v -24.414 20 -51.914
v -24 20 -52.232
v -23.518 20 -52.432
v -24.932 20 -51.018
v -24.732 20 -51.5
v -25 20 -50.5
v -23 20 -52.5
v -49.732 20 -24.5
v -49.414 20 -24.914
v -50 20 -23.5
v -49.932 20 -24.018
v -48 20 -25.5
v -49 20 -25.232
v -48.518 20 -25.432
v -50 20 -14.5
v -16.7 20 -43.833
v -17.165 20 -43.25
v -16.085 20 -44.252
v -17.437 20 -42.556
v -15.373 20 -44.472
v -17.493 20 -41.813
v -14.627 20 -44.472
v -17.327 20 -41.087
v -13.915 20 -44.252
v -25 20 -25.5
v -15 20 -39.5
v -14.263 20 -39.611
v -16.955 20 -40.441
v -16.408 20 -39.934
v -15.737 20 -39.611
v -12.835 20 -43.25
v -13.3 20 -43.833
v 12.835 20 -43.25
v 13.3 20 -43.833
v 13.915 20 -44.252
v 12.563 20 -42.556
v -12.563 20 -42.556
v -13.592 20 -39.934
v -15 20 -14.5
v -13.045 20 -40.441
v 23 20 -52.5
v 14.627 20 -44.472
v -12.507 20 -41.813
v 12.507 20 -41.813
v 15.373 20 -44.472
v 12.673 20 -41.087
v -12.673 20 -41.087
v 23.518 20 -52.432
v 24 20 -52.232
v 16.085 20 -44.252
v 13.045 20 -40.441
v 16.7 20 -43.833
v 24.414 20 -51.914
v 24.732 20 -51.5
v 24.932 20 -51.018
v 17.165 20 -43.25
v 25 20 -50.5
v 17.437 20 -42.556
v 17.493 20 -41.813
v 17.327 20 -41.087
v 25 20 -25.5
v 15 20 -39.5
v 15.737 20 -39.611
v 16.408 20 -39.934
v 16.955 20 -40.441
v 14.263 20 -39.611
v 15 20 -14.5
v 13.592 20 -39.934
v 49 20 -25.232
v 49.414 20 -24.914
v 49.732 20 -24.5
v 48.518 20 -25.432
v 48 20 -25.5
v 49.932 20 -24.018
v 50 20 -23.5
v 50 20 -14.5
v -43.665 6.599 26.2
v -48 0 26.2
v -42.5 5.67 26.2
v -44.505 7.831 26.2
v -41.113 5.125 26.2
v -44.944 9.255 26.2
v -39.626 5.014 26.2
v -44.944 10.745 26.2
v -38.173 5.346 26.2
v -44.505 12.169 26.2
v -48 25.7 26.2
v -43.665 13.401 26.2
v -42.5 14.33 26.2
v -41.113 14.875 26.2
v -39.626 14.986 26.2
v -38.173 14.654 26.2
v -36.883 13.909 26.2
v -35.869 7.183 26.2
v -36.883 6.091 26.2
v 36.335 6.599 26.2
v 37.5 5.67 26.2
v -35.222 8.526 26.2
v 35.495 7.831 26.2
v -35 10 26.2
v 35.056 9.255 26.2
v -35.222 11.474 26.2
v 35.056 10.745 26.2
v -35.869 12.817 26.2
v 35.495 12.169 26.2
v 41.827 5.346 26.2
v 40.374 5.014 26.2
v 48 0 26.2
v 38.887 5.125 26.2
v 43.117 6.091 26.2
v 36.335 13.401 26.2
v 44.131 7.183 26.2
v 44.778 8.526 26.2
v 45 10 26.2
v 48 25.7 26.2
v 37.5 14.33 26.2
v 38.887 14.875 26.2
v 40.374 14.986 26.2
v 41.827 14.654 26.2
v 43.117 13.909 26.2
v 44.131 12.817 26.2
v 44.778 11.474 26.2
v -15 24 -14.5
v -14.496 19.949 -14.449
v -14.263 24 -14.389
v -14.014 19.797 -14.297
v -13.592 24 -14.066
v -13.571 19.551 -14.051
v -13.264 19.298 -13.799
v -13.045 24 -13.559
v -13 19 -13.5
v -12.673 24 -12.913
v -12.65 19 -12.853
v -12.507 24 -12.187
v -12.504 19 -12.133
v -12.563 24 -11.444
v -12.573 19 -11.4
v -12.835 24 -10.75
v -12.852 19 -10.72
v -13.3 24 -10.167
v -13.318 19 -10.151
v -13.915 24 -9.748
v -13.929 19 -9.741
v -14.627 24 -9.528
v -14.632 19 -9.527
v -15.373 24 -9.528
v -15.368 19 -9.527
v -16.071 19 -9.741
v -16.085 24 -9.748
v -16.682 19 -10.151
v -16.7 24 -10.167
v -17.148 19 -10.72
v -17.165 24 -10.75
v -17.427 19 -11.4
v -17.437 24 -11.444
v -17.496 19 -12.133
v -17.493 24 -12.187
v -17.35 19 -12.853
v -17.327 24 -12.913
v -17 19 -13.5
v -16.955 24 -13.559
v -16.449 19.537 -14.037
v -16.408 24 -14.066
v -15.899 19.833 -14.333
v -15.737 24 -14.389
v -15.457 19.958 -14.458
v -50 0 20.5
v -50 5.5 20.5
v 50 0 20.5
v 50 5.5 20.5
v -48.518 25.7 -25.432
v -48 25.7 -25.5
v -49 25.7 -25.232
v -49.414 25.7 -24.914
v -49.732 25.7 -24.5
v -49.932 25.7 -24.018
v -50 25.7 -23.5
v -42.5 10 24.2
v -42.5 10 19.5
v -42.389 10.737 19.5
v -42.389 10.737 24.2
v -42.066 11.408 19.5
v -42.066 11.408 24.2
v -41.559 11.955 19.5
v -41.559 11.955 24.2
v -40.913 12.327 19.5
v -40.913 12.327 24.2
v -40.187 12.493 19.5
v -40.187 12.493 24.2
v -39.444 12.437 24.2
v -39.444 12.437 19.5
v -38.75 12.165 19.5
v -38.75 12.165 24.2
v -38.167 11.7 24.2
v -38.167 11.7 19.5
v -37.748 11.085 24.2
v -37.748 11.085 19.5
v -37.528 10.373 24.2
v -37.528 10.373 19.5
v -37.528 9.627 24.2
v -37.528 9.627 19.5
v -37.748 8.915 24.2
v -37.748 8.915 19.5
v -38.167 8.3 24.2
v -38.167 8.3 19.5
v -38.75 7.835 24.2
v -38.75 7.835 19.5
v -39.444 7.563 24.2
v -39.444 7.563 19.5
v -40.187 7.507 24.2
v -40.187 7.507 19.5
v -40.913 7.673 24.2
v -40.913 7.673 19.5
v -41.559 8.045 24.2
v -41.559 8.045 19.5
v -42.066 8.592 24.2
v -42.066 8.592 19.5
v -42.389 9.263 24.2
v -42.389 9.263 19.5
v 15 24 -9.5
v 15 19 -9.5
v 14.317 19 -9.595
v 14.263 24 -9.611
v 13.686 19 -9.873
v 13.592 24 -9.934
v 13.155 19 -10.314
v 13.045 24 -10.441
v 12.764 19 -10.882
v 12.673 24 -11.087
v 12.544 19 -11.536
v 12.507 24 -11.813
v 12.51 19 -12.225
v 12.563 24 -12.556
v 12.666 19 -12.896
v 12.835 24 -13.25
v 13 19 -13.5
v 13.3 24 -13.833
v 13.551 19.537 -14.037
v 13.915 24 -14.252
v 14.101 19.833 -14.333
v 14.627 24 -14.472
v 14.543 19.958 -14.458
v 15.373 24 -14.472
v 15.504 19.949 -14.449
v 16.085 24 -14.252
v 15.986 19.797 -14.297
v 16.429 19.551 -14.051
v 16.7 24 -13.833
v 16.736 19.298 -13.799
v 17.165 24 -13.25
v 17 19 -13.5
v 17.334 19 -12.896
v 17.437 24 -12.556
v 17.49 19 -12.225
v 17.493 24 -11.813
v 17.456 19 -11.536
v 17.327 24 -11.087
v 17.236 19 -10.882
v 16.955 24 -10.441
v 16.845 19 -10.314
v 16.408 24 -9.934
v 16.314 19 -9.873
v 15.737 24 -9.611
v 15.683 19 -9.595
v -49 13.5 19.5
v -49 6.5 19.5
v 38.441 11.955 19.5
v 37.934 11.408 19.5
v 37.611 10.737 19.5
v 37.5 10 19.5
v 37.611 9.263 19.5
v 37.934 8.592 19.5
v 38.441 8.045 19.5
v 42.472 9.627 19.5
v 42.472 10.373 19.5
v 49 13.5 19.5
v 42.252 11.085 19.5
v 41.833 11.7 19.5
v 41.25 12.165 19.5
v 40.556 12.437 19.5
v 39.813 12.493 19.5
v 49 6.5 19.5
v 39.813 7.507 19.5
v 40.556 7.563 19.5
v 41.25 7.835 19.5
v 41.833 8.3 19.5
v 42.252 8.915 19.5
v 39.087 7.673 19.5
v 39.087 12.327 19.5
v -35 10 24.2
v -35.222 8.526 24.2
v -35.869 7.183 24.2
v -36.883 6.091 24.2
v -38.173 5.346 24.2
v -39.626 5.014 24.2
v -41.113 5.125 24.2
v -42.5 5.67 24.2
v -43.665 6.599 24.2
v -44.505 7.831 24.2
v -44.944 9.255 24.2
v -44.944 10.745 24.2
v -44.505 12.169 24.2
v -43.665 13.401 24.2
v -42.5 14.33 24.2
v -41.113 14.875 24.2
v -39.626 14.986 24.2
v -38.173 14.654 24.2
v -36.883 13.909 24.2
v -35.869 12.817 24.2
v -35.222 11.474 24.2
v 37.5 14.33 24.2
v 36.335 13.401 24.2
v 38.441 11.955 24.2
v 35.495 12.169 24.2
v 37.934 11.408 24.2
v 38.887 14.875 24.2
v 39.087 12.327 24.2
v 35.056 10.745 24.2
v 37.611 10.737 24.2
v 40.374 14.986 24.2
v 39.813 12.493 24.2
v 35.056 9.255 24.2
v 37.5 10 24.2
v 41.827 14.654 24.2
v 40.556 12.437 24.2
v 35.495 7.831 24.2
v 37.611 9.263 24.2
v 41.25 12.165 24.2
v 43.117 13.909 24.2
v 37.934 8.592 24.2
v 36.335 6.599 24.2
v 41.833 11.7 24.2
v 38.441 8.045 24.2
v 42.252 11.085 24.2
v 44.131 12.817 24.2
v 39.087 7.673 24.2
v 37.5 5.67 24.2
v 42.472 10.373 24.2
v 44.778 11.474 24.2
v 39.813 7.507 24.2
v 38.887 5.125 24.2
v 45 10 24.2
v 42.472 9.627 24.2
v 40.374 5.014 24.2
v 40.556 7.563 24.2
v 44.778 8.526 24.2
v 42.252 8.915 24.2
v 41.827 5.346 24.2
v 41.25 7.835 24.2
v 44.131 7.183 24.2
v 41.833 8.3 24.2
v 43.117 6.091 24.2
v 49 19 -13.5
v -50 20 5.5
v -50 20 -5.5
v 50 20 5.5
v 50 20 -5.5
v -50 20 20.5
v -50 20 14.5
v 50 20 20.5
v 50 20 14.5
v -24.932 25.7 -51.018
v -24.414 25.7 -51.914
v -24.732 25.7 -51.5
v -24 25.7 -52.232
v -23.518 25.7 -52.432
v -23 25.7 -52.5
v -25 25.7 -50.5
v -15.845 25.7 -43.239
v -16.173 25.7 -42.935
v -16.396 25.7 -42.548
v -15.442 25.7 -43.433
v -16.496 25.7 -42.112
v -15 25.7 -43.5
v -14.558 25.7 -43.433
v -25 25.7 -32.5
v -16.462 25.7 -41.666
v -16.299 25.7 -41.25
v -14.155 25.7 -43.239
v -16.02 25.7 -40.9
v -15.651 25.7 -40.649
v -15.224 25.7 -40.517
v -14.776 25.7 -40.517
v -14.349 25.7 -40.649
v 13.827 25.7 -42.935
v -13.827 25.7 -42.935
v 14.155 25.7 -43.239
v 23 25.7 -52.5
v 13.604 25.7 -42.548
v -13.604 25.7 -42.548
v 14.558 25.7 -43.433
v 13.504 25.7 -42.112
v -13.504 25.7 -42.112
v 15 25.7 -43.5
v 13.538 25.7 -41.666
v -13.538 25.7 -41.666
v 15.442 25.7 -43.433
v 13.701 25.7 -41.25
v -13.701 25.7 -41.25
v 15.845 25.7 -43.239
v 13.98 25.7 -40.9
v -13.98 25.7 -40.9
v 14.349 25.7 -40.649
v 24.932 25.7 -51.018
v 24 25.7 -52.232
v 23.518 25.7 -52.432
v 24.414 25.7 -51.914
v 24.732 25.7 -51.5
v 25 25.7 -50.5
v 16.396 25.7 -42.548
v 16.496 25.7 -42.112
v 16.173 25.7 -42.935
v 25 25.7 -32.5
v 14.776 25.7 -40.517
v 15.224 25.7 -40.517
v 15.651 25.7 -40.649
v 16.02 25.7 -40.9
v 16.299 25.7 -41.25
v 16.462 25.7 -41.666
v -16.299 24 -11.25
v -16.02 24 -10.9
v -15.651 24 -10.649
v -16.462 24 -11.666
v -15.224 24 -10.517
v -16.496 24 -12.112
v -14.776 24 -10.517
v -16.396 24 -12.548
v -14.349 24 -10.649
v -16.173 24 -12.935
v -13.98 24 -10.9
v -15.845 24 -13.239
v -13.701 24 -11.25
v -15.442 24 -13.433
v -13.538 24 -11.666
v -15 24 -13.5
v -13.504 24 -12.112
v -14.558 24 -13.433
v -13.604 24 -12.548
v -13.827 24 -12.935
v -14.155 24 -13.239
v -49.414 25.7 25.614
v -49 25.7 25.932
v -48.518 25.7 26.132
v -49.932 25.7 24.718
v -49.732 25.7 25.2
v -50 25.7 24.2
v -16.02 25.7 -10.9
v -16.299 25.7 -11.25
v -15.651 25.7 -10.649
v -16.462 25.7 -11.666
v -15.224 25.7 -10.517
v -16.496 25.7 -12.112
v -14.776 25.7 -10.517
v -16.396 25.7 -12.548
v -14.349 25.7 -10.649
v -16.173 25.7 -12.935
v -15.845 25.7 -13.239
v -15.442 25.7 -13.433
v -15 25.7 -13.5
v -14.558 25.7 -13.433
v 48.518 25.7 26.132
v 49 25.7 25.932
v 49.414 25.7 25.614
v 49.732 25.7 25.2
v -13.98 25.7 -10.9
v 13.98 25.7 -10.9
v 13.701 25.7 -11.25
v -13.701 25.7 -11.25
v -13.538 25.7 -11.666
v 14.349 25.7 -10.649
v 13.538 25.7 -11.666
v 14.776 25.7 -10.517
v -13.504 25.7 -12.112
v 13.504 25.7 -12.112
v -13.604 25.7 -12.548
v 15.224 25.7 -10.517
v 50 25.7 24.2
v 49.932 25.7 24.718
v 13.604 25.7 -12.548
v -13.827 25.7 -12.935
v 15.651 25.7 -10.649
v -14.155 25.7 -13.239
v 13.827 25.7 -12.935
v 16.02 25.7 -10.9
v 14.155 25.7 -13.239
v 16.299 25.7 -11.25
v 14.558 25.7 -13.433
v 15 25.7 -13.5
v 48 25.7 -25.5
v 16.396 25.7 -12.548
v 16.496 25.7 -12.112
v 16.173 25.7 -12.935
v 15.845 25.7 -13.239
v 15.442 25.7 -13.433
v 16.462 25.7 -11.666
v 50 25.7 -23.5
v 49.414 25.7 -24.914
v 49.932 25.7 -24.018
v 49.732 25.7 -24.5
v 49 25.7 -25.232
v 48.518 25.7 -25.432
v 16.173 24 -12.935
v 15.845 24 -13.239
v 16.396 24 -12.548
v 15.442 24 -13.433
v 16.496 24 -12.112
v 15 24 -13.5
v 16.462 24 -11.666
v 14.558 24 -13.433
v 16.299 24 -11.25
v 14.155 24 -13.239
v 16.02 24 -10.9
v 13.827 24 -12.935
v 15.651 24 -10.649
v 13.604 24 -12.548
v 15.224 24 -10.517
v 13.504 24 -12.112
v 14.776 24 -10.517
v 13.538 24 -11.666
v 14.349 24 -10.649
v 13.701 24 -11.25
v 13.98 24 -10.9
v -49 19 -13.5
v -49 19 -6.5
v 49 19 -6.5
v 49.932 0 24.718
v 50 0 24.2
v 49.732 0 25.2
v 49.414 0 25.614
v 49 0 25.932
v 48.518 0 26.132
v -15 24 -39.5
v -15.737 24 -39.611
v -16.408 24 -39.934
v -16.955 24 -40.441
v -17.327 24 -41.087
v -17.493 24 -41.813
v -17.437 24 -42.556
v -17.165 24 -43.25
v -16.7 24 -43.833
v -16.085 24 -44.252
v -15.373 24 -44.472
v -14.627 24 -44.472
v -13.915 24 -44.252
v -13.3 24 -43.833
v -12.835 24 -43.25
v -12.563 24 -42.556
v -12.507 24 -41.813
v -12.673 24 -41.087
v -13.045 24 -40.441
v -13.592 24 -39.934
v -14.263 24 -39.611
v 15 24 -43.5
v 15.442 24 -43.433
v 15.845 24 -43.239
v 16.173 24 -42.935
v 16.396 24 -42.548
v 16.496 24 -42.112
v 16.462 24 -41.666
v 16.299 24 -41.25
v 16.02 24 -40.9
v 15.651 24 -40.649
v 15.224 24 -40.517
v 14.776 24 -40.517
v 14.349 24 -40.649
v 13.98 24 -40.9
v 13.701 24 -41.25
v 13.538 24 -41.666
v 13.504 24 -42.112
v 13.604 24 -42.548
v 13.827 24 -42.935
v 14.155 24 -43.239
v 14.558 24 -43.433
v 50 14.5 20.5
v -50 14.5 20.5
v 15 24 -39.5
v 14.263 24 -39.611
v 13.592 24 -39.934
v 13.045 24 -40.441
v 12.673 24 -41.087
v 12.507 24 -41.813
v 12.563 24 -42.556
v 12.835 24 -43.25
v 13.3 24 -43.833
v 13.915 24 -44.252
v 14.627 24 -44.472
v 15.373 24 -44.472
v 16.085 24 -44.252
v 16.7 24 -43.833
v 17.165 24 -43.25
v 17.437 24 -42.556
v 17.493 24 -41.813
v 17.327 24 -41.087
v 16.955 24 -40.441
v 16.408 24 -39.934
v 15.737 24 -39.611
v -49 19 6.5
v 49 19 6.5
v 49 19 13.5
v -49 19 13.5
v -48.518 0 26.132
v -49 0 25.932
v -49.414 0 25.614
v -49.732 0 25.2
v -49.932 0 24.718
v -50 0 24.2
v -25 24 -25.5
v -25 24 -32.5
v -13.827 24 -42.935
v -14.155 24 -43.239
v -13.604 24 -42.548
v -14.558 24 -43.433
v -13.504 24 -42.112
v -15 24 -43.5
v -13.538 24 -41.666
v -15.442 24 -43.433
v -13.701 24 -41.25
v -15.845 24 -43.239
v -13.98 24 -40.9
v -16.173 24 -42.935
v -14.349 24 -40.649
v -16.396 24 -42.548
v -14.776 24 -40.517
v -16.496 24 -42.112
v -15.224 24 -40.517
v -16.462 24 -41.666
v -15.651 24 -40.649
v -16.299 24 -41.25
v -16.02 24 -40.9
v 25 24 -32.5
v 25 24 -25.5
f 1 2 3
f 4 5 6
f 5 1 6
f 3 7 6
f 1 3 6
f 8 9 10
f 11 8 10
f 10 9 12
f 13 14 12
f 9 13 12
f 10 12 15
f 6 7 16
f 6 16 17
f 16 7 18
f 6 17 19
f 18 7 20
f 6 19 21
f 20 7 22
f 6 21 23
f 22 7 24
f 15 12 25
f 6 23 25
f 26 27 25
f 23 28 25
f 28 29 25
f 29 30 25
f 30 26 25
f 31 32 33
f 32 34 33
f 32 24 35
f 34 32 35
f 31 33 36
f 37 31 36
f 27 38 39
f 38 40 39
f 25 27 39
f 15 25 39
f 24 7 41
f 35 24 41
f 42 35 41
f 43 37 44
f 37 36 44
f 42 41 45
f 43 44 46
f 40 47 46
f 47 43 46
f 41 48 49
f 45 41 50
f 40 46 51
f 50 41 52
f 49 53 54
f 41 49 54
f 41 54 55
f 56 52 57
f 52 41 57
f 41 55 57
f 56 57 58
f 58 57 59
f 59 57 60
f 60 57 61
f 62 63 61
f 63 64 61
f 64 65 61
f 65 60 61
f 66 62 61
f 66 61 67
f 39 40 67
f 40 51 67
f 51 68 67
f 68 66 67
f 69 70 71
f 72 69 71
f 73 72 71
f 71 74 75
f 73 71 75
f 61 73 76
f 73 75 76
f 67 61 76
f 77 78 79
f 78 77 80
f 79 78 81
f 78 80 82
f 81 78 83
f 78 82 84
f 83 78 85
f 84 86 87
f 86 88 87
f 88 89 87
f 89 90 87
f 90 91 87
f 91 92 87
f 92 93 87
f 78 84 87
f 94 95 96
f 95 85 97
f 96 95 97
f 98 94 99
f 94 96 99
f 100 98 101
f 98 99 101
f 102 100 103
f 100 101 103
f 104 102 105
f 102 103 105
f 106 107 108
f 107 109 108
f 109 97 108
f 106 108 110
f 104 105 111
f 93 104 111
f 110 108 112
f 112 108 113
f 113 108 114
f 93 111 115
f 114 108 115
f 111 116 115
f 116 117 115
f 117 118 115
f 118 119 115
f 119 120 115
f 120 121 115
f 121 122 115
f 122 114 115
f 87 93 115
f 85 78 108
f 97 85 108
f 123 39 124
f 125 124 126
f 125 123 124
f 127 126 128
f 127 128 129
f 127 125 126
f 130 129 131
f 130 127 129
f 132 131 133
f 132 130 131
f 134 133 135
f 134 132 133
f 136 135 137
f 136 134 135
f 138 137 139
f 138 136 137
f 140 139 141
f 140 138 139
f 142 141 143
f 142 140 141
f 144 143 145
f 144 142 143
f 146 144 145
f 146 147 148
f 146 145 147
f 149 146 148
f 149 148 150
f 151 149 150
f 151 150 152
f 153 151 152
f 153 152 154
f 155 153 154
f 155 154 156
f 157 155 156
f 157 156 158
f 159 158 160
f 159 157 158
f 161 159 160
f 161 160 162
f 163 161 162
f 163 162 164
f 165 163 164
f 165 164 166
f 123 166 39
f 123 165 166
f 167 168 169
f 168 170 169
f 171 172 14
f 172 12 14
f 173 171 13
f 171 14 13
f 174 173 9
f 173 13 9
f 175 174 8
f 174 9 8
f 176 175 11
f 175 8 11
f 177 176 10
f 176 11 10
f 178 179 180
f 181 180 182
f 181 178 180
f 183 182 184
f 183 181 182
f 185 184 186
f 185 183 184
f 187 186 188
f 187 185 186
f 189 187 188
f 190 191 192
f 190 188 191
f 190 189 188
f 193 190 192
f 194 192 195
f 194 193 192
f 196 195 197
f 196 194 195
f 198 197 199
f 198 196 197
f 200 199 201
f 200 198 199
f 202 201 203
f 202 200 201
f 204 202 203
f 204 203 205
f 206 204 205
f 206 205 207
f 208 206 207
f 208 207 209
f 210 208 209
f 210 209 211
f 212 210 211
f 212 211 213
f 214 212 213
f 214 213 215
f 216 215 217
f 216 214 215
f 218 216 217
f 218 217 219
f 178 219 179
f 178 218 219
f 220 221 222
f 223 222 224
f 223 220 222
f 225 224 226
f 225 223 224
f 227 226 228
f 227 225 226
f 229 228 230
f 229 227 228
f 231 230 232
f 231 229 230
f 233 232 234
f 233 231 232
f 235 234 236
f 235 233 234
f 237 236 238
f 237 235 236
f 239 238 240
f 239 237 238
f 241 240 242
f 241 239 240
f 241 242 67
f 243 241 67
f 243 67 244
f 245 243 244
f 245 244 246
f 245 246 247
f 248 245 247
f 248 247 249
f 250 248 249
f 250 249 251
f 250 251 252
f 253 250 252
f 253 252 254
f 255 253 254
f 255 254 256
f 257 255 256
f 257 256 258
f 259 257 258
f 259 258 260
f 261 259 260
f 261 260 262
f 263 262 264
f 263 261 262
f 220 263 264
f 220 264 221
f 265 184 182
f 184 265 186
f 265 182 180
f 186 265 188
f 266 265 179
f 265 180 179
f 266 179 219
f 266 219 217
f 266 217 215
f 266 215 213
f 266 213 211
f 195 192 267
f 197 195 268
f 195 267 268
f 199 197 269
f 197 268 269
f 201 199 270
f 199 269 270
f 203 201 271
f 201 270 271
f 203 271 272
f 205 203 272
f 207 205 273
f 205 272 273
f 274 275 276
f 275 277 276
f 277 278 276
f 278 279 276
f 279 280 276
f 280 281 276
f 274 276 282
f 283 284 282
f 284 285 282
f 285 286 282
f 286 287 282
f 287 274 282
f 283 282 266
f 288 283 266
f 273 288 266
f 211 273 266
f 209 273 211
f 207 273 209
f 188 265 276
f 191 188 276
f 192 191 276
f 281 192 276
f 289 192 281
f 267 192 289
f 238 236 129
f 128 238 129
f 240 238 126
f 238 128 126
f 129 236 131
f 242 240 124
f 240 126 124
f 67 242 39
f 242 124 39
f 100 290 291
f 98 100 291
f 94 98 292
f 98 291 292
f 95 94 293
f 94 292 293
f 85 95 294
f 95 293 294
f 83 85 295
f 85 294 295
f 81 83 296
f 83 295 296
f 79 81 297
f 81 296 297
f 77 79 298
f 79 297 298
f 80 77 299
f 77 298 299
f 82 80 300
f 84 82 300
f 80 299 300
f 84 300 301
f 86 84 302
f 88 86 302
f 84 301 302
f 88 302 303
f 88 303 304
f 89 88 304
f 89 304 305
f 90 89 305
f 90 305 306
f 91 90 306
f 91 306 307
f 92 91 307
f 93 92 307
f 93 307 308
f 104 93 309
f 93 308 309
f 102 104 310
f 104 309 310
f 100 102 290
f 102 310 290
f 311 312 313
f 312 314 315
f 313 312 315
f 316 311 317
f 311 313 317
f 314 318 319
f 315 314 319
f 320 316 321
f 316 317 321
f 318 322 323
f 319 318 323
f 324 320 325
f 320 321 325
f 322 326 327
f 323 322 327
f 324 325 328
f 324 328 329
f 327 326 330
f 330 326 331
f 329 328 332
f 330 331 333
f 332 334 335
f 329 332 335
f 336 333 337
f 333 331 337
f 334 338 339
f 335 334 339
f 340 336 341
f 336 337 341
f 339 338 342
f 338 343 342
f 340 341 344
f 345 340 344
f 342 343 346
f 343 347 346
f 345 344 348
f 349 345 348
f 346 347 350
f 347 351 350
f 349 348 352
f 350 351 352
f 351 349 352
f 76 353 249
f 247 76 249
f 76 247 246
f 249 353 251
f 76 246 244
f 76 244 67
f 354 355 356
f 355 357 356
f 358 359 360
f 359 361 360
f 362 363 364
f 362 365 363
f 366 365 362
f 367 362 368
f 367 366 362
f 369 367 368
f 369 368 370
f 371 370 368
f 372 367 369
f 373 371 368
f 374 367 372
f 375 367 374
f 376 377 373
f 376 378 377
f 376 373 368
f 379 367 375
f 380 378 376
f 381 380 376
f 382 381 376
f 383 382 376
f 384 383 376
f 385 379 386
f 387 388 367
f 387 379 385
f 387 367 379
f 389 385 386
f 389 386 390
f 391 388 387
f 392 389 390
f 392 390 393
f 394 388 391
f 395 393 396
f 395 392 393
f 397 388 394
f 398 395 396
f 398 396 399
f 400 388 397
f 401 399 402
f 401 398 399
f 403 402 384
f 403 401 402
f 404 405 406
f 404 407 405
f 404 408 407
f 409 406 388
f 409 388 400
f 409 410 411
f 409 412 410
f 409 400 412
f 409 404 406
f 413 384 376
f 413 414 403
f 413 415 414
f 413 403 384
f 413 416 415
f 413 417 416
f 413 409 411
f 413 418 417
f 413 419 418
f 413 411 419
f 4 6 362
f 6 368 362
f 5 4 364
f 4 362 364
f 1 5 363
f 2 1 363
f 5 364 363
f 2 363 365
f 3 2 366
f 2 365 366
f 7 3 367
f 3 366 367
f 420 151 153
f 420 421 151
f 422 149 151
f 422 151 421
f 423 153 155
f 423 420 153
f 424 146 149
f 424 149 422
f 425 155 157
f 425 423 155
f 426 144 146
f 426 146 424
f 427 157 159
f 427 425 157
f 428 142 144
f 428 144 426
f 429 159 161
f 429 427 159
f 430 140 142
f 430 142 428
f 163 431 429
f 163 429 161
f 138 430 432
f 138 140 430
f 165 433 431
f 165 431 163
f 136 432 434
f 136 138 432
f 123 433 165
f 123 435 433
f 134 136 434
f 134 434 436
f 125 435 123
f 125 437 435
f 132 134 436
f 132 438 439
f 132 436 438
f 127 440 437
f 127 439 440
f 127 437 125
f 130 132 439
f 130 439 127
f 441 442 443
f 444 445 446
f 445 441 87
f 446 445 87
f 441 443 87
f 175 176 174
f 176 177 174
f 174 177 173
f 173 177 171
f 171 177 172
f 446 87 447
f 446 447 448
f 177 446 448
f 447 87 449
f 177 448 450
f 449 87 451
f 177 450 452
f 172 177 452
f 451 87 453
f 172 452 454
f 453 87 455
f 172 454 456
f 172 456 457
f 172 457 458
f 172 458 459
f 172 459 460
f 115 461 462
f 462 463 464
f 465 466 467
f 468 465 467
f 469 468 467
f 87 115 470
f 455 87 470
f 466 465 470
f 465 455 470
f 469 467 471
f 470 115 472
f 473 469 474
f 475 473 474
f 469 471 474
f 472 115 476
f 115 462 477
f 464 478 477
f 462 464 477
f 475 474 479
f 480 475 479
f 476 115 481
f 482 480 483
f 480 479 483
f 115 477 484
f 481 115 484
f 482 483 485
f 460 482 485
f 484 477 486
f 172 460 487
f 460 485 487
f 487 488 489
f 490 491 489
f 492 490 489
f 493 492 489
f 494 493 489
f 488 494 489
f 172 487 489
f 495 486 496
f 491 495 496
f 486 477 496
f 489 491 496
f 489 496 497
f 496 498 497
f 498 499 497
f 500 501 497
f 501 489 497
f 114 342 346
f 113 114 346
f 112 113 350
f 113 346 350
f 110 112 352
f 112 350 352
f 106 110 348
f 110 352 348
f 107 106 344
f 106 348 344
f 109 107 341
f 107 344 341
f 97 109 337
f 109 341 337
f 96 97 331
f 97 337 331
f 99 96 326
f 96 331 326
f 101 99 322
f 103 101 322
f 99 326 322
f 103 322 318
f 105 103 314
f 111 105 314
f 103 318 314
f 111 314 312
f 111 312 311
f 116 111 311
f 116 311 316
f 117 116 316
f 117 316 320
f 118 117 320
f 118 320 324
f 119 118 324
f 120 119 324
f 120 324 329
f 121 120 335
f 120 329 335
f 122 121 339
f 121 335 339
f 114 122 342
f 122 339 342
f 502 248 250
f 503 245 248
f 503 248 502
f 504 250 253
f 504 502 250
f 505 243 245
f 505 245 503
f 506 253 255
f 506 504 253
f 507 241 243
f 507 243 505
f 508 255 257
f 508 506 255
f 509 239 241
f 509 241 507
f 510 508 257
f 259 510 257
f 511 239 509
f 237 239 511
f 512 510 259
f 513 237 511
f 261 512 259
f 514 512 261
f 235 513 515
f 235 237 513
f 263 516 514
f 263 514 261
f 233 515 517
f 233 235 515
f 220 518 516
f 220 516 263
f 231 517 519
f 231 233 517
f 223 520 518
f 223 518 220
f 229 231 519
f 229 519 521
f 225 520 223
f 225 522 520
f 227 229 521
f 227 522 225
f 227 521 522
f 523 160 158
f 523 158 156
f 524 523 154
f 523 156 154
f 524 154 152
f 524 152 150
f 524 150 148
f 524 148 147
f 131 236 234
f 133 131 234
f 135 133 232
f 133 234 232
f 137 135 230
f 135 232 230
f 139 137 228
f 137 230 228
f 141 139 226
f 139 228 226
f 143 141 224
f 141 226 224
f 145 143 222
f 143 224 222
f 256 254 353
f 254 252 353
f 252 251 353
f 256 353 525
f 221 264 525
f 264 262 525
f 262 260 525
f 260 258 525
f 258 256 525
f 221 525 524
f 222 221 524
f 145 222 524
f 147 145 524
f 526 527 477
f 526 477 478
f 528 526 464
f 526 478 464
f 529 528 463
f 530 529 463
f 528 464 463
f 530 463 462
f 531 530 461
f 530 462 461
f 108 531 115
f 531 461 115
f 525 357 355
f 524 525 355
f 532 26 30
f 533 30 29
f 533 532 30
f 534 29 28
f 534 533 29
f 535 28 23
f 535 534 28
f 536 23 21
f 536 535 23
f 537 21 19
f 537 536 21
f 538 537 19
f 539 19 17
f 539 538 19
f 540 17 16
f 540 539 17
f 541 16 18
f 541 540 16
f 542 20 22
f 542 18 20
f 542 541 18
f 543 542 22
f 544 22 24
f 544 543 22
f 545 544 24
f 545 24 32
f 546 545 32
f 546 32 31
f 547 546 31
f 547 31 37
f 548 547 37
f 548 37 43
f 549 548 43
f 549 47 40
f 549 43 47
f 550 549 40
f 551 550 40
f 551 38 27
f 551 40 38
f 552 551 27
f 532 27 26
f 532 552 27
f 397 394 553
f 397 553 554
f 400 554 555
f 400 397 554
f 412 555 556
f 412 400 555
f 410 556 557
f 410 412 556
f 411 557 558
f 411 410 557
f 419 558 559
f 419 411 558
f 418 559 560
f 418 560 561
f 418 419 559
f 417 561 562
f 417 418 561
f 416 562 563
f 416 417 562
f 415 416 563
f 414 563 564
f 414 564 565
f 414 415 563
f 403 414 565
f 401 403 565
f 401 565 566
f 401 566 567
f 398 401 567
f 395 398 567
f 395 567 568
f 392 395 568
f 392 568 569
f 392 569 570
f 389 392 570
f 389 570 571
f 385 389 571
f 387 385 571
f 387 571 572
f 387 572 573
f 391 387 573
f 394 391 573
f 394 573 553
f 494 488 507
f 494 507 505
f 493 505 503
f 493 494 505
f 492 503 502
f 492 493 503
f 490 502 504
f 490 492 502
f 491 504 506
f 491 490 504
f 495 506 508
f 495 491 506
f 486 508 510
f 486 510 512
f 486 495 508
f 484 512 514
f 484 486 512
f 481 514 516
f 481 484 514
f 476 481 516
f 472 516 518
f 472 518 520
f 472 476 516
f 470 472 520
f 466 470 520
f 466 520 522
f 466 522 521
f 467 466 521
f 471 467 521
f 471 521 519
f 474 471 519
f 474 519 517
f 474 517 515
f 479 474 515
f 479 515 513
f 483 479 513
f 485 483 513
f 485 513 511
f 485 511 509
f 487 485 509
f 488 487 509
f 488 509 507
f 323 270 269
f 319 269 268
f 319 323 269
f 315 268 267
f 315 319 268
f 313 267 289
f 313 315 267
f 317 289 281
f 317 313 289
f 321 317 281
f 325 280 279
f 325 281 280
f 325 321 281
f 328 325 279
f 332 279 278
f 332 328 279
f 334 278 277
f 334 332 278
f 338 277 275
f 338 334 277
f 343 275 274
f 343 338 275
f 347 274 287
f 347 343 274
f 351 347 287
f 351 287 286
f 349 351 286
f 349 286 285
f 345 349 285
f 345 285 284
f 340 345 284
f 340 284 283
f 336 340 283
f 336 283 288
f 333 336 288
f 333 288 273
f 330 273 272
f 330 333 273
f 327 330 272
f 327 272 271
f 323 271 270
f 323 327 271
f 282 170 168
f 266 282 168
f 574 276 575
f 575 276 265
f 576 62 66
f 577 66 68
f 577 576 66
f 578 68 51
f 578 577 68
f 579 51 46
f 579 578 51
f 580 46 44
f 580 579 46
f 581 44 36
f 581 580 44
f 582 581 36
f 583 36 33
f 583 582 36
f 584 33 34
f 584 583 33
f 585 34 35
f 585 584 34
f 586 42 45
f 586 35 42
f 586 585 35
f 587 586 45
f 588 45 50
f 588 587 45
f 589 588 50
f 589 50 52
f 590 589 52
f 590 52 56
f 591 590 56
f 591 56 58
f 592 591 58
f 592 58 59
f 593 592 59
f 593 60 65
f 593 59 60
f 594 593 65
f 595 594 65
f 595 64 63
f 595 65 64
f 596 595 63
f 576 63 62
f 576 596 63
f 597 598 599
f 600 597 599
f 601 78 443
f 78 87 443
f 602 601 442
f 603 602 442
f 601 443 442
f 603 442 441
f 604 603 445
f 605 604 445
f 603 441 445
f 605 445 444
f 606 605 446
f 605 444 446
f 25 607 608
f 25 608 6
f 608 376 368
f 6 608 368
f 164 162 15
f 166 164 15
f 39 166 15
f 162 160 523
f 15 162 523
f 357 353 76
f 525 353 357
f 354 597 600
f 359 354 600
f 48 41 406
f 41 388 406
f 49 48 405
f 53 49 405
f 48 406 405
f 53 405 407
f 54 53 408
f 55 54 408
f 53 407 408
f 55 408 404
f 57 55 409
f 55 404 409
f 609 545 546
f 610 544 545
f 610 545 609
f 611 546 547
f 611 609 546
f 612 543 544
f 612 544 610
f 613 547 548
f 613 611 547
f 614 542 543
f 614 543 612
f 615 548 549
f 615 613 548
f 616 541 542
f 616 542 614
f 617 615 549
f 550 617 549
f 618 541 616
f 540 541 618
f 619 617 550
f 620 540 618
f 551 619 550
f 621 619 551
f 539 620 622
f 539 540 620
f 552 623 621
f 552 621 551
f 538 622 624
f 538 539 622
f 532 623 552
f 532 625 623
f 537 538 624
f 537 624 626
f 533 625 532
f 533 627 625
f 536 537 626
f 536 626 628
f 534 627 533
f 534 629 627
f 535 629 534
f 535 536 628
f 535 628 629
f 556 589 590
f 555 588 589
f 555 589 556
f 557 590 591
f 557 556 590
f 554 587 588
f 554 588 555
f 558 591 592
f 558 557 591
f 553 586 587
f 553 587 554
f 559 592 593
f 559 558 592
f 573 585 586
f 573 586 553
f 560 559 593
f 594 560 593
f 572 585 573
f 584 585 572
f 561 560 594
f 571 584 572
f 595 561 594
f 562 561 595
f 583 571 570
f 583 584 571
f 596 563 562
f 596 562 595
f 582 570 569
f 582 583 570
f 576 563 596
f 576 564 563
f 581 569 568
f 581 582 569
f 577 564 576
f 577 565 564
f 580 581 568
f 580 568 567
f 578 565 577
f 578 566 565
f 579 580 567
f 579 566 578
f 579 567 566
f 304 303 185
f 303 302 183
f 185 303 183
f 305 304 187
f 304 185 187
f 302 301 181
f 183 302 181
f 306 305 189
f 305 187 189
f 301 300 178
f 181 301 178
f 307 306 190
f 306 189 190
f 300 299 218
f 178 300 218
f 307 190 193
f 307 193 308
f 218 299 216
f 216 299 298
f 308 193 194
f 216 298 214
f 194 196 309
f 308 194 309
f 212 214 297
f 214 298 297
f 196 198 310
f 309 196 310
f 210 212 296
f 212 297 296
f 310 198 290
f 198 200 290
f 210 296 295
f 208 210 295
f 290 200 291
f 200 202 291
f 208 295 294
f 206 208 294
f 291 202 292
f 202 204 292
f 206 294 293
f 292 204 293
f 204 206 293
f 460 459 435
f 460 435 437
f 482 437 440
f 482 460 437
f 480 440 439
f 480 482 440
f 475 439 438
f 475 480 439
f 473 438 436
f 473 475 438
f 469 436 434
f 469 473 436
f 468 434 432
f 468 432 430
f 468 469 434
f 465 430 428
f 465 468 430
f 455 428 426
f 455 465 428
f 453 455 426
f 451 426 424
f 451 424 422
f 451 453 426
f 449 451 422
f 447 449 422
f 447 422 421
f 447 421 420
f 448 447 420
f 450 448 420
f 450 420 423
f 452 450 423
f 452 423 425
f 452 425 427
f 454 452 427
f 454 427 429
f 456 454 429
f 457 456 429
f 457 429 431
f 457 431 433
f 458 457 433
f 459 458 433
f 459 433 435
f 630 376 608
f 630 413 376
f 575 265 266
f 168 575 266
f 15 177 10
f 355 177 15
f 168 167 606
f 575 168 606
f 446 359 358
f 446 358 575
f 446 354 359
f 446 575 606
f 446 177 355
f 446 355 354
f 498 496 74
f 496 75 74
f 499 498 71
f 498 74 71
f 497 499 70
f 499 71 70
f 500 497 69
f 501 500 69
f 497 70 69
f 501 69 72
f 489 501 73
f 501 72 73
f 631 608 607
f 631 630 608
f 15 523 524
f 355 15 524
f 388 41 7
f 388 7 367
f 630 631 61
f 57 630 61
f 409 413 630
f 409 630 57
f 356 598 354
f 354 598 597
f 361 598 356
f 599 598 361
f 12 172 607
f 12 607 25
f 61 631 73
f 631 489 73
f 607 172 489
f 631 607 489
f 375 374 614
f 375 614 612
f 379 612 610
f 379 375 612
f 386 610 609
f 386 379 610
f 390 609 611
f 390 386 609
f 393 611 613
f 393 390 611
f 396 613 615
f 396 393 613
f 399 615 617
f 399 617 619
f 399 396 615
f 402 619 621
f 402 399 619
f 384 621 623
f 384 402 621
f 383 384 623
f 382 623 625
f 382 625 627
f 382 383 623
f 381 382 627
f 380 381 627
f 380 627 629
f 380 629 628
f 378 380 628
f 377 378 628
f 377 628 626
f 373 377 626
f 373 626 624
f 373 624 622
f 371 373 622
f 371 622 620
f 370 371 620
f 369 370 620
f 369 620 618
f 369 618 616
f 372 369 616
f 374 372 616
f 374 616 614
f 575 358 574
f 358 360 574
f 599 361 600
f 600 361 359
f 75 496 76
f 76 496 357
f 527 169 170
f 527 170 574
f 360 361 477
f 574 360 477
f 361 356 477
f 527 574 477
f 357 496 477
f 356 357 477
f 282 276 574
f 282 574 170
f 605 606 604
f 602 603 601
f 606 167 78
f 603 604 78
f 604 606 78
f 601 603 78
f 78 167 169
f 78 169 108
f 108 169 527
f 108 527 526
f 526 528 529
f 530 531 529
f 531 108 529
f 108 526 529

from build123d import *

# Parameters (mm, degrees)
BOSS_EXTRUDE1_DEPTH     = 50
BOSS_EXTRUDE2_DEPTH     = 25
CHAMFER1_SIZE           = 1
CUT_EXTRUDE1_DEPTH      = 76.208044782
CUT_EXTRUDE1_DEPTH_BACK = 76.208044782
SKETCH2_R               = 1.5
CUT_EXTRUDE2_DEPTH      = 76.208044782
CUT_EXTRUDE2_DEPTH_BACK = 4
SKETCH2_3_R             = 2.5
SKETCH2_3_R_2           = 1.5
CUT_EXTRUDE3_DEPTH      = 92.348180058
CUT_EXTRUDE3_DEPTH_BACK = 92.348180058
SKETCH3_R               = 2.5
CUT_EXTRUDE4_START      = -4.7
SKETCH3_3_R             = 5
SKETCH3_3_R_2           = 2.5
CUT_EXTRUDE4_DEPTH      = 2
FILLET1_R               = 2


with BuildPart() as part:
    # Sketch1 → Boss-Extrude1 (new, symmetric)
    with BuildSketch(Plane(origin=(0, 0, 0), x_dir=(0, 0, -1), z_dir=(1, 0, 0))):
        Polygon((25.5, 25.7), (25.5, 20), (14.5, 20), (14.5, 19), (5.5, 19), (5.5, 20), (-5.5, 20), (-5.5, 19), (-14.5, 19), (-14.5, 20), (-20.5, 20), (-20.5, 14.5), (-19.5, 14.5), (-19.5, 5.5), (-20.5, 5.5), (-20.5, 0), (-26.2, 0), (-26.2, 25.7), align=None)
    extrude(amount=BOSS_EXTRUDE1_DEPTH, both=True)

    # Sketch1<3> → Boss-Extrude2 (add, symmetric)
    with BuildSketch(Plane(origin=(0, 0, 0), x_dir=(0, 0, -1), z_dir=(1, 0, 0))):
        Polygon((32.5, 24), (25.5, 24), (25.5, 20), (52.5, 20), (52.5, 25.7), (32.5, 25.7), align=None)
    extrude(amount=BOSS_EXTRUDE2_DEPTH, both=True)

    # Chamfer1
    chamfer1_edges = [part.edges().sort_by_distance(p)[0] for p in [
        (0, 5.5, 19.5),
        (0, 14.5, 19.5),
        (0, 19, 14.5),
        (0, 19, 5.5),
        (0, 19, -5.5),
        (0, 19, -14.5),
        (-50, 10, 19.5),
        (50, 10, 19.5),
        (50, 19, 10),
        (-50, 19, 10),
        (50, 19, -10),
        (-50, 19, -10),
    ]]
    chamfer(chamfer1_edges, length=CHAMFER1_SIZE - 0.0001)  # a hair under: the kernel refuses the full size

    # Sketch2 → Cut-Extrude1 (cut, two sides: drawn at the far end of the back side and taken through both)
    with BuildSketch(Plane.XZ.offset(-20).offset(-CUT_EXTRUDE1_DEPTH_BACK)):
        with Locations(Location((-15, -42, 0), (0, 0, 270))):
            Circle(SKETCH2_R)
        with Locations(Location((15, -42, 0), (0, 0, 270))):
            Circle(SKETCH2_R)
        with Locations(Location((-15, -12, 0), (0, 0, 270))):
            Circle(SKETCH2_R)
        with Locations(Location((15, -12, 0), (0, 0, 270))):
            Circle(SKETCH2_R)
    extrude(amount=CUT_EXTRUDE1_DEPTH + CUT_EXTRUDE1_DEPTH_BACK, mode=Mode.SUBTRACT)

    # Sketch2<3> → Cut-Extrude2 (cut, two sides: drawn at the far end of the back side and taken through both)
    # profile 1 of 4: a face of its own
    with BuildSketch(Plane.XZ.offset(-20).offset(-CUT_EXTRUDE2_DEPTH_BACK)):
        with Locations(Location((-15, -12, 0), (0, 0, 270))):
            Circle(SKETCH2_3_R)
        with Locations(Location((-15, -12, 0), (0, 0, 270))):
            Circle(SKETCH2_3_R_2, mode=Mode.SUBTRACT)
    # profile 2 of 4: a face of its own
    with BuildSketch(Plane.XZ.offset(-20).offset(-CUT_EXTRUDE2_DEPTH_BACK)):
        with Locations(Location((-15, -42, 0), (0, 0, 90))):
            Circle(SKETCH2_3_R)
        with Locations(Location((-15, -42, 0), (0, 0, 270))):
            Circle(SKETCH2_3_R_2, mode=Mode.SUBTRACT)
    # profile 3 of 4: a face of its own
    with BuildSketch(Plane.XZ.offset(-20).offset(-CUT_EXTRUDE2_DEPTH_BACK)):
        with Locations(Location((15, -42, 0), (0, 0, 90))):
            Circle(SKETCH2_3_R)
        with Locations(Location((15, -42, 0), (0, 0, 270))):
            Circle(SKETCH2_3_R_2, mode=Mode.SUBTRACT)
    # profile 4 of 4: a face of its own
    with BuildSketch(Plane.XZ.offset(-20).offset(-CUT_EXTRUDE2_DEPTH_BACK)):
        with Locations(Location((15, -12, 0), (0, 0, 90))):
            Circle(SKETCH2_3_R)
        with Locations(Location((15, -12, 0), (0, 0, 270))):
            Circle(SKETCH2_3_R_2, mode=Mode.SUBTRACT)
    extrude(amount=CUT_EXTRUDE2_DEPTH + CUT_EXTRUDE2_DEPTH_BACK, mode=Mode.SUBTRACT)

    # Sketch3 → Cut-Extrude3 (cut, two sides: drawn at the far end of the back side and taken through both)
    with BuildSketch(Plane(origin=(0, 0, 19.5), x_dir=(-1, 0, 0), z_dir=(0, 0, -1)).offset(-CUT_EXTRUDE3_DEPTH_BACK)):
        with Locations((-40, 10)):
            Circle(SKETCH3_R)
        with Locations((40, 10)):
            Circle(SKETCH3_R)
    extrude(amount=CUT_EXTRUDE3_DEPTH + CUT_EXTRUDE3_DEPTH_BACK, mode=Mode.SUBTRACT)

    # Sketch3<3> → Cut-Extrude4 (cut)
    # profile 1 of 2: a face of its own
    with BuildSketch(Plane(origin=(0, 0, 19.5), x_dir=(-1, 0, 0), z_dir=(0, 0, -1)).offset(CUT_EXTRUDE4_START)):
        with Locations(Location((-40, 10, 0), (0, 0, 180))):
            Circle(SKETCH3_3_R)
        with Locations((-40, 10)):
            Circle(SKETCH3_3_R_2, mode=Mode.SUBTRACT)
    # profile 2 of 2: a face of its own
    with BuildSketch(Plane(origin=(0, 0, 19.5), x_dir=(-1, 0, 0), z_dir=(0, 0, -1)).offset(CUT_EXTRUDE4_START)):
        with Locations(Location((40, 10, 0), (0, 0, 180))):
            Circle(SKETCH3_3_R)
        with Locations((40, 10)):
            Circle(SKETCH3_3_R_2, mode=Mode.SUBTRACT)
    extrude(amount=-CUT_EXTRUDE4_DEPTH, mode=Mode.SUBTRACT)

    # Fillet1
    fillet1_edges = [part.edges().sort_by_distance(p)[0] for p in [
        (50, 12.85, 26.2),
        (-50, 12.85, 26.2),
        (-50, 22.85, -25.5),
        (50, 22.85, -25.5),
        (25, 22.85, -52.5),
        (-25, 22.85, -52.5),
    ]]
    fillet(fillet1_edges, radius=FILLET1_R)


solid = part.part
